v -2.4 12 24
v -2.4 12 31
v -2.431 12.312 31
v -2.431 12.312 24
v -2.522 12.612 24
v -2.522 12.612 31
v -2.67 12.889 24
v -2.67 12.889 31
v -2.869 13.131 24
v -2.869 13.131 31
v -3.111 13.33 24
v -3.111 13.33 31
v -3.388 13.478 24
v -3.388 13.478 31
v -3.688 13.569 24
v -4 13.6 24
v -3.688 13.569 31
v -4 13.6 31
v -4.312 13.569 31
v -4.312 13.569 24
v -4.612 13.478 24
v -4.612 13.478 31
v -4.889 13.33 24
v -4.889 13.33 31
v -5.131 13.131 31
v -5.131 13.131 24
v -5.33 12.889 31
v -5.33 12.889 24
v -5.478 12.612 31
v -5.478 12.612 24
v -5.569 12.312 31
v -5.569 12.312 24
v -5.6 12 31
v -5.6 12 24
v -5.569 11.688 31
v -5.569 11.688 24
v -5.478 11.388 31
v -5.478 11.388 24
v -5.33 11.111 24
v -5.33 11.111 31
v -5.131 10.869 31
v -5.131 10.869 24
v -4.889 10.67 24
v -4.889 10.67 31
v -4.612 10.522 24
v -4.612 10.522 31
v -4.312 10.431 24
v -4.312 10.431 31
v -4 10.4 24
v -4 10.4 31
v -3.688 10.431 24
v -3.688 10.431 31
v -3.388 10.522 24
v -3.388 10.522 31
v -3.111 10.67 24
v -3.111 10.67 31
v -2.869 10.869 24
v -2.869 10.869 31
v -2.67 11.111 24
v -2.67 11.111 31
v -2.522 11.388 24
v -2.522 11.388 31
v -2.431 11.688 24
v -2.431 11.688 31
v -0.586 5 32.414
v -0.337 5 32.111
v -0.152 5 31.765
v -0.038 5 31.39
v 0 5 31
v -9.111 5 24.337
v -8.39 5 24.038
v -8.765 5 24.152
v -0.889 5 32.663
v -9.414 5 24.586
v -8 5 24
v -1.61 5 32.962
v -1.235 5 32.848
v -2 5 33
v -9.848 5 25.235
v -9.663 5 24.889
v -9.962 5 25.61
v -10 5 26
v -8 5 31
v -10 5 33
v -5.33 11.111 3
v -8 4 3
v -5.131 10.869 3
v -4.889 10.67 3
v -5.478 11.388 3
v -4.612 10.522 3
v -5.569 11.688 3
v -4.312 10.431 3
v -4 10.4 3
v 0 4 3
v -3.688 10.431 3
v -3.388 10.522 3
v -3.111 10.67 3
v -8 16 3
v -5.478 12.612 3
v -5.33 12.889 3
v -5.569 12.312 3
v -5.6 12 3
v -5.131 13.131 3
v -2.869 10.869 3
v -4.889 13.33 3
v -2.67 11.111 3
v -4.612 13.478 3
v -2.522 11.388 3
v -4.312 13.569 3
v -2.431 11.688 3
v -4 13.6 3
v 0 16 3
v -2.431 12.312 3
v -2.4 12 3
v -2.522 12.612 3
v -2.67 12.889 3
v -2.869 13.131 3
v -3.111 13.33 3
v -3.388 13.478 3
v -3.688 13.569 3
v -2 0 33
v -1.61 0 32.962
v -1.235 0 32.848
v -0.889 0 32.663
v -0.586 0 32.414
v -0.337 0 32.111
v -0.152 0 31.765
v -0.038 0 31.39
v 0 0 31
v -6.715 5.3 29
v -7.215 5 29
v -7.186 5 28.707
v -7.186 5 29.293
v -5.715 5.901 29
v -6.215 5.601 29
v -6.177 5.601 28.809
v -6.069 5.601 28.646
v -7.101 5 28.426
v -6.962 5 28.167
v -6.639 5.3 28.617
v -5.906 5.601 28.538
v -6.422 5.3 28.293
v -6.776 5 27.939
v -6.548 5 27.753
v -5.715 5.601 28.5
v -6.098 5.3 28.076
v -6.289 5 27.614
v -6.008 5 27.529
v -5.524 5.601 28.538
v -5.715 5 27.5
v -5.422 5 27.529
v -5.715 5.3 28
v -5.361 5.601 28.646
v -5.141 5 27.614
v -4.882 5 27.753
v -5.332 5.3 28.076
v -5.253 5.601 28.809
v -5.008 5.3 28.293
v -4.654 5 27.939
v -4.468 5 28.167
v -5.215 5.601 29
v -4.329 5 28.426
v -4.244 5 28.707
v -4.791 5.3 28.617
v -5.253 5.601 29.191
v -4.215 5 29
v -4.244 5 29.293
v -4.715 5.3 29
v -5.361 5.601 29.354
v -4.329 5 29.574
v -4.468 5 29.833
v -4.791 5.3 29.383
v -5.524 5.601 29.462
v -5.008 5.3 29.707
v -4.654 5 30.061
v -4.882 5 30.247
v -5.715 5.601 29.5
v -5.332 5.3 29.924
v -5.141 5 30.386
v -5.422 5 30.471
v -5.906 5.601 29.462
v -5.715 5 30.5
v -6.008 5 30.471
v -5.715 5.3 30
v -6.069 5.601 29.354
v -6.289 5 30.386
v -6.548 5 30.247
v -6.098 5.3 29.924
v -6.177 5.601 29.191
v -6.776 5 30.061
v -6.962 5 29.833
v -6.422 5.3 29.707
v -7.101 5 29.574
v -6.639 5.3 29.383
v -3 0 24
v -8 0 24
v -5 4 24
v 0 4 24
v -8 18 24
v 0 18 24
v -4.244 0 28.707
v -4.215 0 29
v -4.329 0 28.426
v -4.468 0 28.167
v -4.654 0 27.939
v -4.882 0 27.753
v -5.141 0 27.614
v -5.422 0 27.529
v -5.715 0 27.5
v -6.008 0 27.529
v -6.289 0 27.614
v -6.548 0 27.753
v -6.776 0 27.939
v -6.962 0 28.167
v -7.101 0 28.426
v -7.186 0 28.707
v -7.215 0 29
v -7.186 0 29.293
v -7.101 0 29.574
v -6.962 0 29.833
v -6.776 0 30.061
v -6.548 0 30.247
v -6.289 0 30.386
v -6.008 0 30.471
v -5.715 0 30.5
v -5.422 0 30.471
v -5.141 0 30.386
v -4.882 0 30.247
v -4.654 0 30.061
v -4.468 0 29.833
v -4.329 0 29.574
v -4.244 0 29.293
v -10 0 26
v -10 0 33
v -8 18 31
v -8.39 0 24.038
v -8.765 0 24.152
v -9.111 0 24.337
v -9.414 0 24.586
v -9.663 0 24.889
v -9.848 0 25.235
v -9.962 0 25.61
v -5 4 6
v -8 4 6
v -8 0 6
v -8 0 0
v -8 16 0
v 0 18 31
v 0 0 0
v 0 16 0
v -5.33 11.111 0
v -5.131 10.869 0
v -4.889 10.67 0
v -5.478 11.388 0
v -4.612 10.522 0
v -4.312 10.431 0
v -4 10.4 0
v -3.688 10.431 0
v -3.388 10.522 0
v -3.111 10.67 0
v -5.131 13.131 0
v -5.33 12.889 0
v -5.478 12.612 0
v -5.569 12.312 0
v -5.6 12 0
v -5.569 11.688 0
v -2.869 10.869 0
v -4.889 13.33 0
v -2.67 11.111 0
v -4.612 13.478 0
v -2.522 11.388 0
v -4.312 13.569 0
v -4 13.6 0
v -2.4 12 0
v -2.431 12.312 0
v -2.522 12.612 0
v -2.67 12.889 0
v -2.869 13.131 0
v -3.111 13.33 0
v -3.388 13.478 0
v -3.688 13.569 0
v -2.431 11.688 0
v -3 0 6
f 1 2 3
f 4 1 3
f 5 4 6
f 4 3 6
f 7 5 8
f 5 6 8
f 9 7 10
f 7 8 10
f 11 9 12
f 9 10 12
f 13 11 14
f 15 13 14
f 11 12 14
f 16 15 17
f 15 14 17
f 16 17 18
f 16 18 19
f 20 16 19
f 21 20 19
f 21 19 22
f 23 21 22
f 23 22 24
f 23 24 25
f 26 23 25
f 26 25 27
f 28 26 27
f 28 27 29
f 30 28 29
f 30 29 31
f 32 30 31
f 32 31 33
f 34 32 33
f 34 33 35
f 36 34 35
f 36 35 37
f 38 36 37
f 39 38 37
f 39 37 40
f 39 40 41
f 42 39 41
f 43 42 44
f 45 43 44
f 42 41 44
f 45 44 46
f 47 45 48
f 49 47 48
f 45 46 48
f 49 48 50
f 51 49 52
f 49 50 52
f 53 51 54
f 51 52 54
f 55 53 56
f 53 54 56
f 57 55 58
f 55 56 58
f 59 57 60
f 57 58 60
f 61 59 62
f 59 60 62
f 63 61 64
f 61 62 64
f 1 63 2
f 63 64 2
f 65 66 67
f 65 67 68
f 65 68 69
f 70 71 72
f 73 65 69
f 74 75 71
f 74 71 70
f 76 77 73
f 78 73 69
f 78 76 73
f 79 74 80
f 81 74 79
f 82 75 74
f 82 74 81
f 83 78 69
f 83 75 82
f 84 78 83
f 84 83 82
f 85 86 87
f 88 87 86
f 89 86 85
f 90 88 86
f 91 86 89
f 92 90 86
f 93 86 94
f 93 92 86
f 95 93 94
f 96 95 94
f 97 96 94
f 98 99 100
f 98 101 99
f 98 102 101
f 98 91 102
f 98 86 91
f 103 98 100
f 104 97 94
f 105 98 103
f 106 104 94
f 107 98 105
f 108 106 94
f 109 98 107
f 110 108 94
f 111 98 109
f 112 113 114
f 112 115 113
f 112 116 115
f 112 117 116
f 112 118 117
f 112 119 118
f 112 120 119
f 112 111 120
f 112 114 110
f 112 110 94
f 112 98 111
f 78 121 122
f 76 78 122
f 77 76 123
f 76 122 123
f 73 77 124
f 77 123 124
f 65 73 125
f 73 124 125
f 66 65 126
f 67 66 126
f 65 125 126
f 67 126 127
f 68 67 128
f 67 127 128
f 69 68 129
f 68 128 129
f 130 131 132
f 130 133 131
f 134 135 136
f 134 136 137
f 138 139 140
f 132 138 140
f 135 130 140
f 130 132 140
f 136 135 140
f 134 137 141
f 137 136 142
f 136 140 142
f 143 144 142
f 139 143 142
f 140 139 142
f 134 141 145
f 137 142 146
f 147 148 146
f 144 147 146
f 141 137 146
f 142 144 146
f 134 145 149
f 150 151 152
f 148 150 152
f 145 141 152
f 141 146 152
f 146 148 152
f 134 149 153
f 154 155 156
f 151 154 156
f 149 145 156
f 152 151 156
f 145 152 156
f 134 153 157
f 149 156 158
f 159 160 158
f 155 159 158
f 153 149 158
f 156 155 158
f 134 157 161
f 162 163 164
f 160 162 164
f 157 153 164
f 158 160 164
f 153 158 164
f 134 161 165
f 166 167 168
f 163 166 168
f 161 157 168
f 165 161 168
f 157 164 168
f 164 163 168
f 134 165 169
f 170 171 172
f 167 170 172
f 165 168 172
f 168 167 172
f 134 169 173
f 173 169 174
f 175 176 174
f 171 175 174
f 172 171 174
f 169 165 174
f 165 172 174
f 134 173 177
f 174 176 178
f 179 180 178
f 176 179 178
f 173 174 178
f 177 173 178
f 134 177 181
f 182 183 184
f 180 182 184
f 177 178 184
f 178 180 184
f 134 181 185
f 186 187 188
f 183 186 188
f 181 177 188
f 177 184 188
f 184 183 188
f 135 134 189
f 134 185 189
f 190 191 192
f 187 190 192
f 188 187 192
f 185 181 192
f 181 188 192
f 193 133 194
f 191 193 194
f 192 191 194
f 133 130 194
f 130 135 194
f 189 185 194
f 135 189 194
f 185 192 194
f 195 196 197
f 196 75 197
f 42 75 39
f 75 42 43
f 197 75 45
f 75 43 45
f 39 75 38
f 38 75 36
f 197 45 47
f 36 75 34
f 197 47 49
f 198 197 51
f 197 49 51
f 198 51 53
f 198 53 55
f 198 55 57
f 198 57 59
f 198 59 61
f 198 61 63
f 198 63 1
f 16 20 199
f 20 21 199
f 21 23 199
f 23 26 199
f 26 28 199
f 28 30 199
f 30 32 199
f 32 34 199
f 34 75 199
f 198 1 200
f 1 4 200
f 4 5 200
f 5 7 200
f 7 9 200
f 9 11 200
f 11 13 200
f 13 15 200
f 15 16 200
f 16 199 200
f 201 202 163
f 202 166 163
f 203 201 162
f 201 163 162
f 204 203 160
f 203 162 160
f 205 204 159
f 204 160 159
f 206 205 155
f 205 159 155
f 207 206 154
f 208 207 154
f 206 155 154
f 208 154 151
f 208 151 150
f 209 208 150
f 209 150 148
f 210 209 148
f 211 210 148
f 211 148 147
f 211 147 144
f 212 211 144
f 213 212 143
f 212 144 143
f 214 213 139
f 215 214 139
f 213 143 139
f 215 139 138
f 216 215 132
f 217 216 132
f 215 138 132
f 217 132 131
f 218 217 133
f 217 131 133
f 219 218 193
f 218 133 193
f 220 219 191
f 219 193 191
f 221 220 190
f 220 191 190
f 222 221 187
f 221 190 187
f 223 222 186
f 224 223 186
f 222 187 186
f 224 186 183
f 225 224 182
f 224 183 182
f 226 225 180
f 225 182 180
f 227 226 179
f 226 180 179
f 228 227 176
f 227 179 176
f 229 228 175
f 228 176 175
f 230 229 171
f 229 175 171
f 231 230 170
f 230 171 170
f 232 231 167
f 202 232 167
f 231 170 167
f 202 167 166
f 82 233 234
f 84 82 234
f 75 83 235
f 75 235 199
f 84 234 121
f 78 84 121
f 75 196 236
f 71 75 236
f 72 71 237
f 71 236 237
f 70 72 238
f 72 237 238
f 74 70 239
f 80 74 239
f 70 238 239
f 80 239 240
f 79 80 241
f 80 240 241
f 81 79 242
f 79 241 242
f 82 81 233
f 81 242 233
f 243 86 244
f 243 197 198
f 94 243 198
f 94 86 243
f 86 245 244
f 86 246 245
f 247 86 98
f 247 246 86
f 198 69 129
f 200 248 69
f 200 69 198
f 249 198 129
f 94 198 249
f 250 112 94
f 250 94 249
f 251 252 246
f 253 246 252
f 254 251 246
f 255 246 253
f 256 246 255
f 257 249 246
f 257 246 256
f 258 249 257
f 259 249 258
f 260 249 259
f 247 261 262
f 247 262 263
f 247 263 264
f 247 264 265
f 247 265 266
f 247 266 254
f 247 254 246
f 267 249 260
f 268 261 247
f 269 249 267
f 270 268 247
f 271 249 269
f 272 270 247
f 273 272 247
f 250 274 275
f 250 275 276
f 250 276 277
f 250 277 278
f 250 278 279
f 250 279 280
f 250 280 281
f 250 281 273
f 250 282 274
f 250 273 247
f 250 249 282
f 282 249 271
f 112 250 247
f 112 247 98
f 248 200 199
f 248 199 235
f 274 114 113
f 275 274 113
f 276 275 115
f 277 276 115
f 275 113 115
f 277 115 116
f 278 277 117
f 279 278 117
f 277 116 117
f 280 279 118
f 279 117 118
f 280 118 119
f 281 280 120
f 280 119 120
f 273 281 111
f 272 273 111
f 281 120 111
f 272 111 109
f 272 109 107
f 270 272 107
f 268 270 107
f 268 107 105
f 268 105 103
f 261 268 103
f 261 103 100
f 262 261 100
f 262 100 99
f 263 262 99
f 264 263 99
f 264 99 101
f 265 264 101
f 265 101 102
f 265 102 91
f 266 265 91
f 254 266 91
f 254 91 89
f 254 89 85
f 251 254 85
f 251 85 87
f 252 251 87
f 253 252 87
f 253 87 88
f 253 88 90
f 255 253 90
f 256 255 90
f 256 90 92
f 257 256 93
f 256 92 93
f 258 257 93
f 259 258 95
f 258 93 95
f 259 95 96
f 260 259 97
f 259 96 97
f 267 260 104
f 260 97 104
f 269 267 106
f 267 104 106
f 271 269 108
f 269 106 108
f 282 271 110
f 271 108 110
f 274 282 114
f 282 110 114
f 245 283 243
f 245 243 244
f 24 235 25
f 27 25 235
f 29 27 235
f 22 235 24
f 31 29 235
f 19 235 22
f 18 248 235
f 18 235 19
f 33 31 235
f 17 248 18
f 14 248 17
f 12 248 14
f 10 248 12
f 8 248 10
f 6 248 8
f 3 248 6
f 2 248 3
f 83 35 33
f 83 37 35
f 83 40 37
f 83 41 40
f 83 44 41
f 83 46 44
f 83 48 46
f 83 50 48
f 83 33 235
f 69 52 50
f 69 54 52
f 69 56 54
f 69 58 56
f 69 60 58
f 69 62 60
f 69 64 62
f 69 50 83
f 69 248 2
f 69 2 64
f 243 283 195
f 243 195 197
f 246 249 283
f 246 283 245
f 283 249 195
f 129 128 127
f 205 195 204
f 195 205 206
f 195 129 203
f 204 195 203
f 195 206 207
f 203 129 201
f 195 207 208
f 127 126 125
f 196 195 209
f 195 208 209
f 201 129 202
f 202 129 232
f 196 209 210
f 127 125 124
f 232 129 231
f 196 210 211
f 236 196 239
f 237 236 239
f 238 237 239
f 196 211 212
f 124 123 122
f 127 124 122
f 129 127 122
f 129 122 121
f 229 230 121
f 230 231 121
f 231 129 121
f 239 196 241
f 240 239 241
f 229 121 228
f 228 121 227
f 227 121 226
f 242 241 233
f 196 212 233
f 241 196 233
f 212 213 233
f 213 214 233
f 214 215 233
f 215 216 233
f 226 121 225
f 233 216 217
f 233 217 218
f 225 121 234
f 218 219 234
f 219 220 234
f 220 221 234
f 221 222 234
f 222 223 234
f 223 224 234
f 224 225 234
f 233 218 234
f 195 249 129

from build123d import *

# Parameters (mm, degrees)
BOSS_EXTRUDE1_DEPTH       = 8
CUT_EXTRUDE2_DEPTH        = 21
BOSS_EXTRUDE2_DEPTH       = 3
BOSS_EXTRUDE5_DEPTH       = 5
SKETCH6_R                 = 1.6
CUT_EXTRUDE3_DEPTH        = 38.215588132
F_3_0MM_DOWEL_HOLE1_D     = 3
F_3_0MM_DOWEL_HOLE1_DEPTH = 5
F_3_0MM_DOWEL_HOLE1_TIP   = 0.901290929


with BuildPart() as part:
    # Sketch1 → Boss-Extrude1 (new body)
    with BuildSketch(Plane(origin=(0, 0, 0), x_dir=(0, 0, -1), z_dir=(1, 0, 0))):
        Polygon((0, 0), (0, 16), (-3, 16), (-3, 4), (-24, 4), (-24, 18), (-31, 18), (-31, 0), align=None)
    extrude(amount=-BOSS_EXTRUDE1_DEPTH)

    # Sketch5 → Cut-Extrude2 (cut)
    with BuildSketch(Plane.XY.offset(3)):
        Polygon((-8, 0), (-3, 0), (-5, 4), (-8, 4), align=None)
    extrude(amount=CUT_EXTRUDE2_DEPTH, mode=Mode.SUBTRACT)

    # Sketch8 → Boss-Extrude2 (add)
    with BuildSketch(Plane.XY.offset(3)):
        Polygon((-8, 4), (-5, 4), (-3, 0), (-8, 0), align=None)
    extrude(amount=BOSS_EXTRUDE2_DEPTH)

    # Sketch11 → Boss-Extrude5 (add)
    with BuildSketch(Plane.XZ):
        with BuildLine():
            Line((-10, 26), (-10, 33))
            Line((-10, 33), (-2, 33))
            ThreePointArc((-2, 33), (-0.585786438, 32.414213562), (0, 31))
            Line((0, 31), (-8, 31))
            Line((-8, 31), (-8, 24))
            ThreePointArc((-8, 24), (-9.414213562, 24.585786438), (-10, 26))
        make_face()
    extrude(amount=-BOSS_EXTRUDE5_DEPTH)

    # Sketch6 → Cut-Extrude3 (cut, through all)
    with BuildSketch(Plane.XY.offset(31)):
        with Locations((-4, 12)):
            Circle(SKETCH6_R)
    extrude(amount=-CUT_EXTRUDE3_DEPTH, mode=Mode.SUBTRACT)

    # Ø3.0mm Dowel Hole1
    with Locations(Plane(origin=(0, 0, 0), x_dir=(-1, 0, 0), z_dir=(0, -1, 0))):
        with Locations((5.715, -29)):
            Hole(F_3_0MM_DOWEL_HOLE1_D / 2, depth=F_3_0MM_DOWEL_HOLE1_DEPTH)
            with Locations((0, 0, -(F_3_0MM_DOWEL_HOLE1_DEPTH + F_3_0MM_DOWEL_HOLE1_TIP / 2))):  # 118° drill point
                Cone(0, F_3_0MM_DOWEL_HOLE1_D / 2, F_3_0MM_DOWEL_HOLE1_TIP, mode=Mode.SUBTRACT)


solid = part.part
